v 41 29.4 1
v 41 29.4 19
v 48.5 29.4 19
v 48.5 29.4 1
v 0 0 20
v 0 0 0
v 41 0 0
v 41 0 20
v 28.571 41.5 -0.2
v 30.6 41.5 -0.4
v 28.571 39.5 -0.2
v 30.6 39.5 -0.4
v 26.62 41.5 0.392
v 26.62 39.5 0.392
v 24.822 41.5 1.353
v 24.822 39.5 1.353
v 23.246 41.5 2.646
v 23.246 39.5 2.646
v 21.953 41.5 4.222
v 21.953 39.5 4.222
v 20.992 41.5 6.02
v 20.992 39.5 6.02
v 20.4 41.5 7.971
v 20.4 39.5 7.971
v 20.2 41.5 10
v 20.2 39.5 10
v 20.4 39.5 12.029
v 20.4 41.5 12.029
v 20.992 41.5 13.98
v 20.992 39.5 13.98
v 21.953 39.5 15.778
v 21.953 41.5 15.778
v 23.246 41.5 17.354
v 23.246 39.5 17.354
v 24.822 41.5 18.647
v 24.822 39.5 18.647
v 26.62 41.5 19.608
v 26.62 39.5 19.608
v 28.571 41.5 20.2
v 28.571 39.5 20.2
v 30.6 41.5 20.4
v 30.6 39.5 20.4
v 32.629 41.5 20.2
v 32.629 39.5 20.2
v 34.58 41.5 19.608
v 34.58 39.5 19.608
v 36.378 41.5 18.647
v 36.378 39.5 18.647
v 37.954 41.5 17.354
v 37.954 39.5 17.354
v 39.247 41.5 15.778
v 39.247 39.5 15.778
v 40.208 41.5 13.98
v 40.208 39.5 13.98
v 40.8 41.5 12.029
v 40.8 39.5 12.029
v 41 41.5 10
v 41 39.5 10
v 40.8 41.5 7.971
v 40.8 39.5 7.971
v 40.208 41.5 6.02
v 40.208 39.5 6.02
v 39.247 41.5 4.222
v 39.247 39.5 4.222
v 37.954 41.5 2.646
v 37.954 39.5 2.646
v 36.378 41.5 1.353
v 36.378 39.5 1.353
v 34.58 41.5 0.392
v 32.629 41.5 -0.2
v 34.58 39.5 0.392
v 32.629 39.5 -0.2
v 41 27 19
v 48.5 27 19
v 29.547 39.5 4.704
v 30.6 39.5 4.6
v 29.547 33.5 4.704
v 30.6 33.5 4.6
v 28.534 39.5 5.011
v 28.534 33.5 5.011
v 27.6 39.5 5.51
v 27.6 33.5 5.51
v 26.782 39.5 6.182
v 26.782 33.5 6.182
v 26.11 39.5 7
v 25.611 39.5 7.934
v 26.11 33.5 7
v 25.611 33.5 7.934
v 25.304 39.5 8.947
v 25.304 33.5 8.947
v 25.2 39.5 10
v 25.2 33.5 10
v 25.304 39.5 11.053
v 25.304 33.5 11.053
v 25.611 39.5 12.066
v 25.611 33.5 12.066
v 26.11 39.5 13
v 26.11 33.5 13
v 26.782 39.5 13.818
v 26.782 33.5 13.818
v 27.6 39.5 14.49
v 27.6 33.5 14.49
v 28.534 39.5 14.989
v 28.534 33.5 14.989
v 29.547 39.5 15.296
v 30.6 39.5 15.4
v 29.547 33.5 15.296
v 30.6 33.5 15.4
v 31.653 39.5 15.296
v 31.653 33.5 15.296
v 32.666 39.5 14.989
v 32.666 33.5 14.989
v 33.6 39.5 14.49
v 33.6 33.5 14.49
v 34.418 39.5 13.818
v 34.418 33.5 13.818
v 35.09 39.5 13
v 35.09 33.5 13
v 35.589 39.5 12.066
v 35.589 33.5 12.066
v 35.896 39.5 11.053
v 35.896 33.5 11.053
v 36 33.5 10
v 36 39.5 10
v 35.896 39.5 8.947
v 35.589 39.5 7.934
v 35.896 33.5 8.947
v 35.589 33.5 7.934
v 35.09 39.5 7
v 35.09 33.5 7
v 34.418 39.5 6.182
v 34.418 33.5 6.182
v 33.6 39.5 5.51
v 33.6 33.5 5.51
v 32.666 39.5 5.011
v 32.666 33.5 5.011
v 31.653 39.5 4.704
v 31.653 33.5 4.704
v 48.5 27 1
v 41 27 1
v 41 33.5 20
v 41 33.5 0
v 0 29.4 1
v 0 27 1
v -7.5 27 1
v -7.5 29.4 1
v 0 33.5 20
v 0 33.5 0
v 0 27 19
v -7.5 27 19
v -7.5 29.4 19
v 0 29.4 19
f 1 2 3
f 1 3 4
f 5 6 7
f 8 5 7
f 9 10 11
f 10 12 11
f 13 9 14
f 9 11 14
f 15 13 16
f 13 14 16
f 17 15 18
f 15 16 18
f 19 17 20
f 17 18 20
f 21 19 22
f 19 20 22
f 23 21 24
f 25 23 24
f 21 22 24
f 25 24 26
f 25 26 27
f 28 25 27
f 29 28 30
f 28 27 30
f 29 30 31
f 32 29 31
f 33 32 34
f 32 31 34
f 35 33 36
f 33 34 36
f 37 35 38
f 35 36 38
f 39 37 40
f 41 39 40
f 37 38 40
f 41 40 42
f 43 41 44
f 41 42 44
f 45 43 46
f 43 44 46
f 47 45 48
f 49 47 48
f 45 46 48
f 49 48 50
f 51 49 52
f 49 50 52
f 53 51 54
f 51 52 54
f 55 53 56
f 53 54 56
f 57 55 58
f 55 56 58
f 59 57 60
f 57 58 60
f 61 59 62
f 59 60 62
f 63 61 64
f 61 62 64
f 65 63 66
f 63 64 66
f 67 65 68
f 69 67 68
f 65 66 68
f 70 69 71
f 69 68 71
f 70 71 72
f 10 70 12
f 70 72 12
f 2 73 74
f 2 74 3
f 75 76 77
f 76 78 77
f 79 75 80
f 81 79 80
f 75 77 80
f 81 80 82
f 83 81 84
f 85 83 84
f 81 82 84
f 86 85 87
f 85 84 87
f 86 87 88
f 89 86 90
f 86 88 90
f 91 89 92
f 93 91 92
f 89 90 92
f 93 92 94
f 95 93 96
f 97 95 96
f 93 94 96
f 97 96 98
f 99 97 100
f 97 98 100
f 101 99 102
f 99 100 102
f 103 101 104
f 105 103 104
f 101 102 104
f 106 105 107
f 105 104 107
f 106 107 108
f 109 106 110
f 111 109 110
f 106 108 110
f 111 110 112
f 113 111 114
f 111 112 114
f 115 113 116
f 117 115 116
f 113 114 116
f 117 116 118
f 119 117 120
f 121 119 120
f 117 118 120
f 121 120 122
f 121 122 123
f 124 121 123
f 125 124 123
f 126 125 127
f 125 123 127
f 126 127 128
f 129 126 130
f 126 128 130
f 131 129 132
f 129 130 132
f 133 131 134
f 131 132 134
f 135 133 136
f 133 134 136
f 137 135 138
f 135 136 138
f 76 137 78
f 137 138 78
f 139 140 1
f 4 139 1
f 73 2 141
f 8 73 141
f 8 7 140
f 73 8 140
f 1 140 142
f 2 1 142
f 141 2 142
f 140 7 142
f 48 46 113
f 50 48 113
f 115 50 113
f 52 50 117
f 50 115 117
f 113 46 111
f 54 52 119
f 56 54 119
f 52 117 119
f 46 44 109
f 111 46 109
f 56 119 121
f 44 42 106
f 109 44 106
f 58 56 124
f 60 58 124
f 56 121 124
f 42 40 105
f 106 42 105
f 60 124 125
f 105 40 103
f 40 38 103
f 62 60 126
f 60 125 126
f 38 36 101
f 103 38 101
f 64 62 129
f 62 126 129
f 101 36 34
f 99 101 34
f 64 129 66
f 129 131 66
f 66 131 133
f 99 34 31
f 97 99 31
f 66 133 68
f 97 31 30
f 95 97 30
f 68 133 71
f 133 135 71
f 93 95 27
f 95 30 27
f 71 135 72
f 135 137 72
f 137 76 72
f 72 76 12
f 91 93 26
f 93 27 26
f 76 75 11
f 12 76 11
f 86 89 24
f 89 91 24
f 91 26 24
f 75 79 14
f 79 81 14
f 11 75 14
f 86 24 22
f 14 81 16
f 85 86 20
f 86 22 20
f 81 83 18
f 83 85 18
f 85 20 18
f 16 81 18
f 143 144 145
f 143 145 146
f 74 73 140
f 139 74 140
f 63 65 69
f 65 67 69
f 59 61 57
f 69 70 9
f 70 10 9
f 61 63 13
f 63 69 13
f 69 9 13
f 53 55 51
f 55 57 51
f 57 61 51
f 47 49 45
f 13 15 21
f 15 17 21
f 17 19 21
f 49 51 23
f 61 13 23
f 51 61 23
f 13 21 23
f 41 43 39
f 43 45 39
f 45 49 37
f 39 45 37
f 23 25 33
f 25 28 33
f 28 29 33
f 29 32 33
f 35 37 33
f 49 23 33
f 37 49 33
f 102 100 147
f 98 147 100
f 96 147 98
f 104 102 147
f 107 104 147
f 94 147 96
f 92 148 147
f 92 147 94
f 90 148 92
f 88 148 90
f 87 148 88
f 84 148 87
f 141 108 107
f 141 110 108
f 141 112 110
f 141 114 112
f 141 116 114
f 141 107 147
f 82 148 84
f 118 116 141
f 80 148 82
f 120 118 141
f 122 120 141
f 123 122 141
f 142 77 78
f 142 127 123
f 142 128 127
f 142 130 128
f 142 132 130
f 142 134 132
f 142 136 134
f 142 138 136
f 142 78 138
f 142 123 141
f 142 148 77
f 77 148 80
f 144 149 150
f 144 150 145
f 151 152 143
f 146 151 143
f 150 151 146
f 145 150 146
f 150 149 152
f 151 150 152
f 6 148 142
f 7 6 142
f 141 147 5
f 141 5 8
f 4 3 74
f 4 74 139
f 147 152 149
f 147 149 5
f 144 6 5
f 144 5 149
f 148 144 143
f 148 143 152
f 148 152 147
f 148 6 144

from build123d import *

# Parameters (mm, degrees)
SKETCH1_W           = 41
SKETCH1_H           = 33.5
BOSS_EXTRUDE1_DEPTH = 20
SKETCH3_W           = 18
SKETCH3_H           = 2.4
BOSS_EXTRUDE2_DEPTH = 7.5


with BuildPart() as part:
    # Sketch1 → Boss-Extrude1 (new body)
    with BuildSketch(Plane.XY):
        with Locations((20.5, 16.75)):
            Rectangle(SKETCH1_W, SKETCH1_H)
    extrude(amount=BOSS_EXTRUDE1_DEPTH)

    # Sketch3 → Boss-Extrude2 (add)
    with BuildSketch(Plane(origin=(41, 0, 0), x_dir=(0, 0, -1), z_dir=(1, 0, 0))):
        with Locations((-10, 28.2)):
            Rectangle(SKETCH3_W, SKETCH3_H)
    boss_extrude2 = extrude(amount=BOSS_EXTRUDE2_DEPTH)

    # Mirror1: Boss-Extrude2 across plane
    add(boss_extrude2.mirror(Plane(origin=(20.5, 0, 0), x_dir=(0, 0, 1), z_dir=(1, 0, 0))))

    # Sketch5 → Revolve1 (revolve)
    with BuildSketch(Plane.XY.offset(10), mode=Mode.PRIVATE) as revolve1_sk:
        Polygon((30.6, 33.5), (30.6, 41.5), (41, 41.5), (41, 39.5), (36, 39.5), (36, 33.5), align=None)
    revolve(revolve1_sk.sketch.rotate(Axis((30.6, 33.5, 10), (0, 1, 0)), 90), axis=Axis((30.6, 33.5, 10), (0, 1, 0)))


solid = part.part
